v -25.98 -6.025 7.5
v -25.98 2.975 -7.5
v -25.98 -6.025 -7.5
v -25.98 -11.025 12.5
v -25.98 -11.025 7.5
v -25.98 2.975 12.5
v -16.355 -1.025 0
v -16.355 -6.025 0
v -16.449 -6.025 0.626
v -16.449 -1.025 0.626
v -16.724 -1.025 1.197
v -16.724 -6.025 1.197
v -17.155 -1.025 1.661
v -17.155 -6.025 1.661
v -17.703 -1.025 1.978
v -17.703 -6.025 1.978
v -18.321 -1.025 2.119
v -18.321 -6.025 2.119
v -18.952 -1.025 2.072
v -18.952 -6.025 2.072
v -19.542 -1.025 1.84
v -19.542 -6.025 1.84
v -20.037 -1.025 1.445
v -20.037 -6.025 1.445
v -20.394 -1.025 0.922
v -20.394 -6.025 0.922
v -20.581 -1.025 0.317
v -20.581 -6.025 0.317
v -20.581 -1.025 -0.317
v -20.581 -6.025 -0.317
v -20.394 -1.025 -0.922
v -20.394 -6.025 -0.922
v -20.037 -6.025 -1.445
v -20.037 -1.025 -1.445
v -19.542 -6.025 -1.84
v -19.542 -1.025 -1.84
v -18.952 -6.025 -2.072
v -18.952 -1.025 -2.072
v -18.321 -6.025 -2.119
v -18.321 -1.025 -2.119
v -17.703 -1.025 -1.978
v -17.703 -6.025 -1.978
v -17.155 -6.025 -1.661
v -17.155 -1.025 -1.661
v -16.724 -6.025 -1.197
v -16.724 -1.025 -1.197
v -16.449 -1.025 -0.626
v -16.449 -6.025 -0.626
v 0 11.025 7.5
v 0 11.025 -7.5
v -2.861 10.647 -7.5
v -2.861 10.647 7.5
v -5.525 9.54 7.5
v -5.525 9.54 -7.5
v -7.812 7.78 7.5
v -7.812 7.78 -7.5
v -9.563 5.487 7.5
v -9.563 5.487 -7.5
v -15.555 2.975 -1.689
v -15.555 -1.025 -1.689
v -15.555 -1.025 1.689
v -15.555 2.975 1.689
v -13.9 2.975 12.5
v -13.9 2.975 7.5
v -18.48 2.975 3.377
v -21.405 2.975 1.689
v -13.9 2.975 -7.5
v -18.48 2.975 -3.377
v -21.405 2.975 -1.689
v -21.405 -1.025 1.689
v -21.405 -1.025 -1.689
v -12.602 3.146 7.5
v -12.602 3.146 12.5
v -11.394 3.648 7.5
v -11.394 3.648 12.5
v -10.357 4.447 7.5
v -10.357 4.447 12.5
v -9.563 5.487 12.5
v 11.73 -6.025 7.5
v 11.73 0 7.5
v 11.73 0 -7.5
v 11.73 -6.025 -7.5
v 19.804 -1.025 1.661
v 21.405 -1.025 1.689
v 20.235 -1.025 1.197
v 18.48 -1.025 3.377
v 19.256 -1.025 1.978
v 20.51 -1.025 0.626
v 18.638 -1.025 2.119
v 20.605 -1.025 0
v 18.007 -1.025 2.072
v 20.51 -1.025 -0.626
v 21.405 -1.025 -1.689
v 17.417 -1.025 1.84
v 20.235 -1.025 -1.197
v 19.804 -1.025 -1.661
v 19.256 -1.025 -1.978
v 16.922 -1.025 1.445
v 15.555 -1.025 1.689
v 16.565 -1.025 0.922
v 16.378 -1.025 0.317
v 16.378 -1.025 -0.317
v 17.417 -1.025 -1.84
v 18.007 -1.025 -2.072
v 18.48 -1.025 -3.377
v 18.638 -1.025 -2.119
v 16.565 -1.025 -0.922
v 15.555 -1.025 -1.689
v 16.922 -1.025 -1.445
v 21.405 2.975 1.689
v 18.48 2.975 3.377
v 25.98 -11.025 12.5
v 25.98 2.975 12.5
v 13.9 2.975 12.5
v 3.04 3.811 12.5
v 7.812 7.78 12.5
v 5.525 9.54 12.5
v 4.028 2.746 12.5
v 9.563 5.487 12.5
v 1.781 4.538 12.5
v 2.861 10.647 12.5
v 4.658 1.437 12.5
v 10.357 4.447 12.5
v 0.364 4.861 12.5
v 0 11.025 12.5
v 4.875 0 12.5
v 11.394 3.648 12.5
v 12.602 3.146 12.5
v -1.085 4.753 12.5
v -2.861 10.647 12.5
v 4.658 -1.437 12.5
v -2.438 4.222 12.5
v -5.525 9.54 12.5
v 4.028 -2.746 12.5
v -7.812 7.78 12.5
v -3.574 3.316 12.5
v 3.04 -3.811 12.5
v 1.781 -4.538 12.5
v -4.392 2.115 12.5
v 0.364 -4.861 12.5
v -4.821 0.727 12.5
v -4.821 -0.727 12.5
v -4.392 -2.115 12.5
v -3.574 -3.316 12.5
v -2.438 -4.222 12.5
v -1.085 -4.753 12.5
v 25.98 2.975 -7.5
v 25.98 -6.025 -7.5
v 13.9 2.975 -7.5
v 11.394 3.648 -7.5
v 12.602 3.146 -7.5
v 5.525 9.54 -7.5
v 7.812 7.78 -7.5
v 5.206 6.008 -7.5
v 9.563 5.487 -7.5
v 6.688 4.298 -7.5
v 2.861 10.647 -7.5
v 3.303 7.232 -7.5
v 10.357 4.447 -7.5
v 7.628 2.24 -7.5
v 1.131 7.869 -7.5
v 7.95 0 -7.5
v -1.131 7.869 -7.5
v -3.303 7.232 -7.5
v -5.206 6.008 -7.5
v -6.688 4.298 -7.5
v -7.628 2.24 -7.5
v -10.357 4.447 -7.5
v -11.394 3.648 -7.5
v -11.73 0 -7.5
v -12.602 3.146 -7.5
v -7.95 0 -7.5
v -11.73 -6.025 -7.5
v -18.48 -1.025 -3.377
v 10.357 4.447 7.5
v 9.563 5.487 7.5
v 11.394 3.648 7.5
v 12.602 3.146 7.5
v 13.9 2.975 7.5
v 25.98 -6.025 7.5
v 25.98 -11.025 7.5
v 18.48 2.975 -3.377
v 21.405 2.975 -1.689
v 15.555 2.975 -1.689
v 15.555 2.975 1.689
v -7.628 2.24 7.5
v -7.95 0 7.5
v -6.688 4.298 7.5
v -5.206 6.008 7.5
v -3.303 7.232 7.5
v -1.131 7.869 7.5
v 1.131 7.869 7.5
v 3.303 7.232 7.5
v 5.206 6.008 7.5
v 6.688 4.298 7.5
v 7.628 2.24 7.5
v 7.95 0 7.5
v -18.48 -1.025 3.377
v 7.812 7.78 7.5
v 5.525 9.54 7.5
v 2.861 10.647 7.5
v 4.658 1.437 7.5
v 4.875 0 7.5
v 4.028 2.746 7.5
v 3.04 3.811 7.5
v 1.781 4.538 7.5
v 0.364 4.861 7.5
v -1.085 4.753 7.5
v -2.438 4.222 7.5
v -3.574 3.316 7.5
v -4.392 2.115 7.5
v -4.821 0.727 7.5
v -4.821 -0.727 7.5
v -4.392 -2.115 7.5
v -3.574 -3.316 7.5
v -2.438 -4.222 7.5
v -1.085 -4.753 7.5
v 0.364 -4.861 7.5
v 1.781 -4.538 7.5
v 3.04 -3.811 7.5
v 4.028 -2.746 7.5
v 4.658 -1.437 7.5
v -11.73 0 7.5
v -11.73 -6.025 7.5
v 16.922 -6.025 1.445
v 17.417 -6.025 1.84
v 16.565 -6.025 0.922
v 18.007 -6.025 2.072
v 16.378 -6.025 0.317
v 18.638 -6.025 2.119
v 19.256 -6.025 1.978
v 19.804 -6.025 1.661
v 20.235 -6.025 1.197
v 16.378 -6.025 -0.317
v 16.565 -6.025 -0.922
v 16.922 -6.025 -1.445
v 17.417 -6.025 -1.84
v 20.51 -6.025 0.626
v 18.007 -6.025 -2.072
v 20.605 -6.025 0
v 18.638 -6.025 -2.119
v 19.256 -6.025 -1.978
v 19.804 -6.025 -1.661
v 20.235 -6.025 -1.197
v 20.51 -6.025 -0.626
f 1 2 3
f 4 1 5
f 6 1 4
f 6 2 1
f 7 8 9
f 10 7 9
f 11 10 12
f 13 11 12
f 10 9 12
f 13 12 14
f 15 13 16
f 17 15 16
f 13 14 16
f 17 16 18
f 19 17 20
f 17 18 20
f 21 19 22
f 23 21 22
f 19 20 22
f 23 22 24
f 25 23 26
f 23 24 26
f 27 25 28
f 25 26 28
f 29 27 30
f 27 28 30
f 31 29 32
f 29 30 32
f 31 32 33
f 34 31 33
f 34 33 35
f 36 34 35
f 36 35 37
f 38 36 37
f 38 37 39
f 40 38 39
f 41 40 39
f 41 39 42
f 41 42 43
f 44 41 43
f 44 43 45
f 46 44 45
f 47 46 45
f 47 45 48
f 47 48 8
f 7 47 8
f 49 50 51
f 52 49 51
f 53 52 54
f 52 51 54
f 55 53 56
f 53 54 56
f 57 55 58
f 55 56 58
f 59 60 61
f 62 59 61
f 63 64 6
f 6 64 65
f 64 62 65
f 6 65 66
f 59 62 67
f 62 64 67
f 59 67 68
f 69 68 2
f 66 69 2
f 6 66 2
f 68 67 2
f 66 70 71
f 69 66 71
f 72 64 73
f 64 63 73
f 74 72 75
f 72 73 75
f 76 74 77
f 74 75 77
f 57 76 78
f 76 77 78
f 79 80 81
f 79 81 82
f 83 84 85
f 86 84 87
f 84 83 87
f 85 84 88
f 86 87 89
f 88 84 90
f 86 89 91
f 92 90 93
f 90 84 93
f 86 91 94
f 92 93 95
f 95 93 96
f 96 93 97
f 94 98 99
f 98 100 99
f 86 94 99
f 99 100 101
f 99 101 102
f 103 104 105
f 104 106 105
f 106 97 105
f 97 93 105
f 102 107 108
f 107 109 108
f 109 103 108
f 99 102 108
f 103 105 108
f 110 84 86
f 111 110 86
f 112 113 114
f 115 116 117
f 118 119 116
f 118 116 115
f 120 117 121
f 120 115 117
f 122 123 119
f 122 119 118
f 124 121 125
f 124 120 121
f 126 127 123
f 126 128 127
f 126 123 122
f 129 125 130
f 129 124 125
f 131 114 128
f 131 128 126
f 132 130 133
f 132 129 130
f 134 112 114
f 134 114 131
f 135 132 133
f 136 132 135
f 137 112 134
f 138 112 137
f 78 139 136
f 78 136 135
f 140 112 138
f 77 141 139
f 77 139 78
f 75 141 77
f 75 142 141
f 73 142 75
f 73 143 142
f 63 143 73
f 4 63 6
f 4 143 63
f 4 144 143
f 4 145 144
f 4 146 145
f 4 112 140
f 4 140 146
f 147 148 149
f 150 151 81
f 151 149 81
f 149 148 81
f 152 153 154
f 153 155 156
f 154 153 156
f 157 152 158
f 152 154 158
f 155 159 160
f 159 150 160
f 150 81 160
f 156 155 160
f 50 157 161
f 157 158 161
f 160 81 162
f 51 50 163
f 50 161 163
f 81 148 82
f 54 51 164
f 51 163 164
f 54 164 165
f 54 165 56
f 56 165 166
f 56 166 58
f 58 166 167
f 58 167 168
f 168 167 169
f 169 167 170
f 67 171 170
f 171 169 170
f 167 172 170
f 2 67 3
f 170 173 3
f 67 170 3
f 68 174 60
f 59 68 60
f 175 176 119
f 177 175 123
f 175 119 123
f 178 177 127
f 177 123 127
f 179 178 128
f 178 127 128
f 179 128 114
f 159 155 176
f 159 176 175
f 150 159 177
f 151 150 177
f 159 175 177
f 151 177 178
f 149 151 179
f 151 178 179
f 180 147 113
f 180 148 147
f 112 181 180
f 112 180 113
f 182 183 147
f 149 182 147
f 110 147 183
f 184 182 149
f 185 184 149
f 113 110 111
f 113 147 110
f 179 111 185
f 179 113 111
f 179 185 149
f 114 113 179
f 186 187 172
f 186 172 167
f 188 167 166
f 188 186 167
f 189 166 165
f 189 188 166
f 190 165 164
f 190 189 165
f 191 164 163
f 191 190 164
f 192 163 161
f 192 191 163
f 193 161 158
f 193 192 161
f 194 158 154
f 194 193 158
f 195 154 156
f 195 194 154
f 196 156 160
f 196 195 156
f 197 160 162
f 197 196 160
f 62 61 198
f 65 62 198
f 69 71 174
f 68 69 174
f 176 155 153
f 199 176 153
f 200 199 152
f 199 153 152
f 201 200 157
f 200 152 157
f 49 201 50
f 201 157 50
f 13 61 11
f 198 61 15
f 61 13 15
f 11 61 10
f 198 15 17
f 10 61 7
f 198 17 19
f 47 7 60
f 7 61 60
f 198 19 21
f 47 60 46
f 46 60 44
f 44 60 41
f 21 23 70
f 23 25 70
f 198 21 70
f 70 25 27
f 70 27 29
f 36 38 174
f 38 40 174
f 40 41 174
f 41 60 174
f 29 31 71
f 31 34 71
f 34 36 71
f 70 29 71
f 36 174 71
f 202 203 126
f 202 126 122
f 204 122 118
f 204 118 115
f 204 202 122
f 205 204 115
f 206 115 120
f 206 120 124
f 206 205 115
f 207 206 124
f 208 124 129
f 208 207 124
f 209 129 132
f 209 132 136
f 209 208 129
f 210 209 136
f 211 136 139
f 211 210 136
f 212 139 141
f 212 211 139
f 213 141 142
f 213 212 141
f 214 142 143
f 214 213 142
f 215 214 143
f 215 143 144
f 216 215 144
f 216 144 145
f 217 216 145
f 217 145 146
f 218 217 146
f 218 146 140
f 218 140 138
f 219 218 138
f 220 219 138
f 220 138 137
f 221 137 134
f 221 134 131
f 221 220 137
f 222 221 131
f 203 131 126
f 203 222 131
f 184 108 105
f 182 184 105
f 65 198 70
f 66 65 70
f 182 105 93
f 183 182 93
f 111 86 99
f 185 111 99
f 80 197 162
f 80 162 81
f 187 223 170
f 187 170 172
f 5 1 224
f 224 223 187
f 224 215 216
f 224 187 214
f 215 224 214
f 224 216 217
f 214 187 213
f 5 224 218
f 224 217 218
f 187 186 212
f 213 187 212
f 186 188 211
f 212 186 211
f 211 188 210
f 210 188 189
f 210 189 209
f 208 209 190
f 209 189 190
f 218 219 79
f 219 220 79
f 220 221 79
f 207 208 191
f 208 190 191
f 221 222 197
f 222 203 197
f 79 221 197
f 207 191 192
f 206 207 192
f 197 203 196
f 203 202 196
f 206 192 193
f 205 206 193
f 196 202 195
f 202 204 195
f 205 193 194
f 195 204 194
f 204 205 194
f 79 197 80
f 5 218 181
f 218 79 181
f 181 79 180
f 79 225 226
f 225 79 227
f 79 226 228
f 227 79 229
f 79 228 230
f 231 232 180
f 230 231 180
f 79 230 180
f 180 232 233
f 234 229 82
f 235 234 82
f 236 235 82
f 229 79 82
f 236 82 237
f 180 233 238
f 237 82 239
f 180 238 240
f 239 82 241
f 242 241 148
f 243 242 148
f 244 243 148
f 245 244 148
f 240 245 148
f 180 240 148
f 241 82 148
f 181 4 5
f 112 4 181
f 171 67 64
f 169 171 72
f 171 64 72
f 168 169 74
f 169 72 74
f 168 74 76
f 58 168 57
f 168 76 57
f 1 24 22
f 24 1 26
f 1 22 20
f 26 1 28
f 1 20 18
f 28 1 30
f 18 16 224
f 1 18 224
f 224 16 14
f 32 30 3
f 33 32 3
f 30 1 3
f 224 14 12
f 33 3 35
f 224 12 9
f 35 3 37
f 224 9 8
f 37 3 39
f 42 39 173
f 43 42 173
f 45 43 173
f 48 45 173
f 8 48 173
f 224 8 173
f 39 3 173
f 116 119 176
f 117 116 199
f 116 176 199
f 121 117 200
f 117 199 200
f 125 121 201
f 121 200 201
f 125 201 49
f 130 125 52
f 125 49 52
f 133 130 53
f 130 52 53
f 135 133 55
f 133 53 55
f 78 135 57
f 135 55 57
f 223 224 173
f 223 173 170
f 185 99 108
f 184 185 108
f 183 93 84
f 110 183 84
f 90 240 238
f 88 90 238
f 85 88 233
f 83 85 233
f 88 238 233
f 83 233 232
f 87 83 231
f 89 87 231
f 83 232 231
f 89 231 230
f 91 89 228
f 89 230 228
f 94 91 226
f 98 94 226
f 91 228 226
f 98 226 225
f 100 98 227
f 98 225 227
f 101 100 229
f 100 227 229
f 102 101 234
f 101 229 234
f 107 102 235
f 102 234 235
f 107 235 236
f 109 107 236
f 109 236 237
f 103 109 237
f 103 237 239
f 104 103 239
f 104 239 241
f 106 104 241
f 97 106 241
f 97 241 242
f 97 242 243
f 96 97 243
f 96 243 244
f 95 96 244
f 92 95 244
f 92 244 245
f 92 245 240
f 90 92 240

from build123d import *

# Parameters (mm, degrees)
F0_R      = 4.75
F1_DEPTH  = 7.5
F2_R      = 2.125
F3_DEPTH  = 25
F5_DEPTH  = 15.001
F7_DEPTH  = 7.5
F8_R      = 4.875
F9_DEPTH  = 5
F10_W     = 51.95911
F10_H     = 5
F11_DEPTH = 5
F12_W     = 11.8
F12_H     = 20
F13_DEPTH = 4
F14_R     = 5
F16_DEPTH = 25


with BuildPart() as f1:
    # F0 (on Top) → F1 (new body, symmetric)
    with BuildSketch(Plane.XY):
        with BuildLine():
            Line((-10.979555, -11.025), (0, -11.025))
            Line((0, -11.025), (10.979555, -11.025))
            Line((10.979555, -11.025), (10.979555, -6.025))
            Line((10.979555, -6.025), (25.979555, -6.025))
            Line((25.979555, -6.025), (25.979555, -1.025))
            Line((25.979555, -1.025), (10.979555, -1.025))
            Line((10.979555, -1.025), (10.979555, 1))
            ThreePointArc((10.979555, 1), (7.433896, 8.141733), (0, 11.025))
            ThreePointArc((0, 11.025), (-7.433896, 8.141733), (-10.979555, 1))
            Line((-10.979555, 1), (-10.979555, -1.025))
            Line((-10.979555, -1.025), (-25.979555, -1.025))
            Line((-25.979555, -1.025), (-25.979555, -6.025))
            Line((-25.979555, -6.025), (-10.979555, -6.025))
            Line((-10.979555, -6.025), (-10.979555, -11.025))
        make_face()
        Circle(F0_R, mode=Mode.SUBTRACT)
    extrude(amount=F1_DEPTH, both=True)

    # F2 (on face) → F3 (cut)
    with BuildSketch(Plane.XZ.offset(11.025)):
        with Locations((-18.479555, 0)):
            Circle(F2_R)
        with Locations((18.479555, 0)):
            Circle(F2_R)
    extrude(amount=-F3_DEPTH, mode=Mode.SUBTRACT)

    # F4 (on face) → F5 (cut, through all)
    with BuildSketch(Plane.XY.offset(7.5)):
        with BuildLine():
            Line((10.979555, -0.0125), (7.82499, -0.0125))
            ThreePointArc((7.82499, -0.0125), (0, 7.825), (-7.82499, -0.0125))
            Line((-7.82499, -0.0125), (-10.979555, -0.0125))
            Line((-10.979555, -0.0125), (-10.979555, -6.025))
            Line((-10.979555, -6.025), (-10.979555, -11.025))
            Line((-10.979555, -11.025), (10.979555, -11.025))
            Line((10.979555, -11.025), (10.979555, -6.025))
            Line((10.979555, -6.025), (10.979555, -0.0125))
        make_face()
    extrude(amount=-F5_DEPTH, mode=Mode.SUBTRACT)

    # F6 (on Top) → F7 (join, symmetric)
    with BuildSketch(Plane.XY):
        with BuildLine():
            Line((-10.979555, -1.025), (-10.979555, 1))
            ThreePointArc((-10.979555, 1), (-10.842852, 1.995794), (-10.616026, 2.975))
            Line((-10.616026, 2.975), (-14.179555, 2.975))
            Line((-14.179555, 2.975), (-14.179555, -1.025))
            Line((-14.179555, -1.025), (-10.979555, -1.025))
        make_face()
        with BuildLine():
            Line((14.179555, 2.975), (10.616026, 2.975))
            ThreePointArc((10.616026, 2.975), (10.842852, 1.995794), (10.979555, 1))
            Line((10.979555, 1), (10.979555, -1.025))
            Line((10.979555, -1.025), (14.179555, -1.025))
            Line((14.179555, -1.025), (14.179555, 2.975))
        make_face()
    extrude(amount=F7_DEPTH, both=True)

    # F8 (on face) → F9 (join)
    with BuildSketch(Plane.XY.offset(7.5)):
        with BuildLine():
            Line((-25.979555, -6.025), (-10.979555, -6.025))
            Line((-10.979555, -6.025), (10.979555, -6.025))
            Line((10.979555, -6.025), (25.979555, -6.025))
            Line((25.979555, -6.025), (25.979555, -1.025))
            Line((25.979555, -1.025), (14.179555, -1.025))
            Line((14.179555, -1.025), (14.179555, 2.975))
            Line((14.179555, 2.975), (10.616026, 2.975))
            ThreePointArc((10.616026, 2.975), (0, 11.025), (-10.616026, 2.975))
            Line((-10.616026, 2.975), (-14.179555, 2.975))
            Line((-14.179555, 2.975), (-14.179555, -1.025))
            Line((-14.179555, -1.025), (-25.979555, -1.025))
            Line((-25.979555, -1.025), (-25.979555, -6.025))
        make_face()
        Circle(F8_R, mode=Mode.SUBTRACT)
    extrude(amount=F9_DEPTH)

    # F10 (on face) → F11 (join)
    with BuildSketch(Plane.XZ.offset(6.025)):
        with Locations((0, 10)):
            Rectangle(F10_W, F10_H)
    extrude(amount=F11_DEPTH)

    # F12 (on face) → F13 (join)
    with BuildSketch(Plane(origin=(0, -1.025, 0), x_dir=(-1, 0, 0), z_dir=(0, 1, 0))):
        with Locations((-20.079555, 2.5)):
            Rectangle(F12_W, F12_H)
        Polygon((-18.479555, 3.377499), (-15.554555, 1.68875), (-15.554555, -1.68875), (-18.479555, -3.377499), (-21.404555, -1.68875), (-21.404555, 1.68875), align=None, mode=Mode.SUBTRACT)
        with Locations((20.079555, 2.5)):
            Rectangle(F12_W, F12_H)
        Polygon((15.554555, 1.68875), (18.479555, 3.377499), (21.404555, 1.68875), (21.404555, -1.68875), (18.479555, -3.377499), (15.554555, -1.68875), align=None, mode=Mode.SUBTRACT)
    extrude(amount=F13_DEPTH)

    # F14
    f14_edges = [f1.edges().sort_by_distance(p)[0] for p in [
        (6.661503, 8.78493, 0),
        (10.616026, 2.975, 10),
        (-6.661503, 8.78493, 0),
        (-10.616026, 2.975, 10),
    ]]
    fillet(f14_edges, radius=F14_R)

    # F15 (on face) → F16 (cut)
    with BuildSketch(Plane(origin=(0, 0, 7.5), x_dir=(1, 0, 0), z_dir=(0, 0, -1))):
        with BuildLine():
            Line((11.729555, 6.025), (-11.729555, 6.025))
            Line((-11.729555, 6.025), (-11.729555, 0))
            Line((-11.729555, 0), (-7.95, 0))
            ThreePointArc((-7.95, 0), (0, -7.95), (7.95, 0))
            Line((7.95, 0), (11.729555, 0))
            Line((11.729555, 0), (11.729555, 6.025))
        make_face()
    extrude(amount=F16_DEPTH, mode=Mode.SUBTRACT)


solid = f1.part
